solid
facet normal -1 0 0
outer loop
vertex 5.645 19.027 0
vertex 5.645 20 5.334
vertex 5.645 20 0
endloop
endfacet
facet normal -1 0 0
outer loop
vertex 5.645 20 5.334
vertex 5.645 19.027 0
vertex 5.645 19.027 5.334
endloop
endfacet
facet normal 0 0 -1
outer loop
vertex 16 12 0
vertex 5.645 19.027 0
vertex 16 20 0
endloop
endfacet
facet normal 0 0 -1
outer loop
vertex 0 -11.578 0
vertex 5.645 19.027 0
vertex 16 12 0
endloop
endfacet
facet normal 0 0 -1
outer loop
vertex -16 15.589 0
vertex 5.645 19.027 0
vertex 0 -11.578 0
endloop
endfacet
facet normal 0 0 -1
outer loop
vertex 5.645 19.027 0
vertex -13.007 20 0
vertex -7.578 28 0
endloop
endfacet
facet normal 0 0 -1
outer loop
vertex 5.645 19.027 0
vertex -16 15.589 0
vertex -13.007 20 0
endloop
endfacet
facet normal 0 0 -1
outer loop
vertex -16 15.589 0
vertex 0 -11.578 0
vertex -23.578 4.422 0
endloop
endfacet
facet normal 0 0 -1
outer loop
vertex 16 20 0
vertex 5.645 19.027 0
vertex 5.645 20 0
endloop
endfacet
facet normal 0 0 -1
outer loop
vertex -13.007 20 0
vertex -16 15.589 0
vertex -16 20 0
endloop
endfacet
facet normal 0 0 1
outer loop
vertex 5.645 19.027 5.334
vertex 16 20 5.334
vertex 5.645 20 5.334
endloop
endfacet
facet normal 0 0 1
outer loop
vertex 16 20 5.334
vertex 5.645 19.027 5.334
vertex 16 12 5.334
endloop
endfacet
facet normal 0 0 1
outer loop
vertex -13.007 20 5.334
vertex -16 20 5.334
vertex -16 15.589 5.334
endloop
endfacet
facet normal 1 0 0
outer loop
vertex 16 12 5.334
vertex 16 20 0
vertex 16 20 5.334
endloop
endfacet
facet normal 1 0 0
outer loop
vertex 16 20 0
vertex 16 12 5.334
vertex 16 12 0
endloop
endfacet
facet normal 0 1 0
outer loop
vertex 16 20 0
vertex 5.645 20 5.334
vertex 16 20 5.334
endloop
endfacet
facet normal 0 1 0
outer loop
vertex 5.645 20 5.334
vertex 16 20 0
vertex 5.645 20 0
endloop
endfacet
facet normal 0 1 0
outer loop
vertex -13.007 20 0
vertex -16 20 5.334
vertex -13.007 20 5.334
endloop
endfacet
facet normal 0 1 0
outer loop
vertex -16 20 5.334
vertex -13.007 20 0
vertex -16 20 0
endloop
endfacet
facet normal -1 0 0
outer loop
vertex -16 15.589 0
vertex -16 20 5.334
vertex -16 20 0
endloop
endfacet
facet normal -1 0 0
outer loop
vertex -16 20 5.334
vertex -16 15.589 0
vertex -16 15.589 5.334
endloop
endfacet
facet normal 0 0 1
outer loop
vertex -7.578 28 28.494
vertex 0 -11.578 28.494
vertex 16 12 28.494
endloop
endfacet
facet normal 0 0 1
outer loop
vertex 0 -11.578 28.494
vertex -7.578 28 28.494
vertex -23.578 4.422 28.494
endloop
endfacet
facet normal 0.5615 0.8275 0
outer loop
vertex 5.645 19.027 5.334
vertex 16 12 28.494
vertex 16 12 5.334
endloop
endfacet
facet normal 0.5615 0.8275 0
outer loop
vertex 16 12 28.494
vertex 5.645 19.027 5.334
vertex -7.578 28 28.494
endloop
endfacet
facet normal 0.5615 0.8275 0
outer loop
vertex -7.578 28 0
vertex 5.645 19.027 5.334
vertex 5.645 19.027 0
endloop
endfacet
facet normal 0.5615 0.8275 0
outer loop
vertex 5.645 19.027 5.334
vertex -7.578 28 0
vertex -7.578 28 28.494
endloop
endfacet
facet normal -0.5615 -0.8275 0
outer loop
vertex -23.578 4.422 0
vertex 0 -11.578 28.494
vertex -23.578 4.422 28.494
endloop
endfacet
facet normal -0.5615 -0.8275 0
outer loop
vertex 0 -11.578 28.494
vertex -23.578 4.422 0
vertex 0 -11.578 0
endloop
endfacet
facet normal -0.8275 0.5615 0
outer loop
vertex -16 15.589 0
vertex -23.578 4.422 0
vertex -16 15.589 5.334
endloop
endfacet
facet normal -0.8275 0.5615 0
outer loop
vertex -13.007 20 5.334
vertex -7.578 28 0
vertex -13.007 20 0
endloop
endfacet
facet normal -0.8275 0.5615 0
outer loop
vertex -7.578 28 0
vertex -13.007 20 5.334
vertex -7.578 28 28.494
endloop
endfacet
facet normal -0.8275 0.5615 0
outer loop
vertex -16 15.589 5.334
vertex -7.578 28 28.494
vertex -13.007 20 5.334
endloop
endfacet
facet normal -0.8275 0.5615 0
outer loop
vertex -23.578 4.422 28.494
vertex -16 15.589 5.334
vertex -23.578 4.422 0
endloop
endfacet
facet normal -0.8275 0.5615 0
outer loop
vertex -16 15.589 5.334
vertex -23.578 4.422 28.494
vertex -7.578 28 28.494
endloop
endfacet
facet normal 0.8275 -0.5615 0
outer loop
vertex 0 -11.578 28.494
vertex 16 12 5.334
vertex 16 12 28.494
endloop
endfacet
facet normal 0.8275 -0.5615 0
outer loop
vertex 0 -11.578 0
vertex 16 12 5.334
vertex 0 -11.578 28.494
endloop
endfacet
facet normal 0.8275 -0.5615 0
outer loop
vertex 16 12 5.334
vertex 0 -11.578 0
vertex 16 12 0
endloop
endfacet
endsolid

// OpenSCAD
trim=.2;
tw=32;
th=36;
td=25.4*.21;
sr=5;
sr2=0;
wings=0;
bspace=0;
try3=1;
jlap=4; //(th-tw)/2;
jbolt=2.5;
jlock=0;
jbex=jlock?6-td:0; //6-td;
olap=0; //jlap;
olap2=0; //olap;
bot=3;//25.4/4;
bit=bot;
xo=(tw-(sr*2)-(td+jbex))/3;

run=tw/2;
topy=th-tw/2;
dist1=sqrt(pow(topy-jlap*2,2)+pow(run,2));
ang1=atan((topy-jlap*2)-run);
dist2=sqrt(pow(bit/2-4,2)+pow(dist1,2));
boty=-bit/2-dist2/2;
rise=topy-(boty+jlap*2);
h=sqrt(pow(rise,2)+pow(run,2));
cutang=atan(rise/run);
echo(str("TD:",td,",XO:",xo,",Cut:",rise,"/",run,"~",cutang));
bblock();
#translate([0,boty]) rotate([0,0,cutang]) cube(h);
*!bblock_profile();
*!union(){
  xc=5;
  yc=8;
  xx=10;
  xy=th-tw-4;
  for(x=[0:tw+xx:(tw+xx)*(xc-1)+.01],y=[0:th+xy:(th+xy)*(yc-1)+.01])
    translate([x,y]) {
      bblock(0);
      translate([tw/2+xx/2,7]) rotate([0,0,180]) bblock(1);
    }
  if(bit!=bot) for(x=[0,tw+10]) translate([x,th]) cap();
}
*!for(s=[5,4,3]) translate([s*20-60,0]) spacer(s);
*!bblock(0);
*!preview(0);

*!union() {
  preview(0,40);
  translate([0,(th-jlap*2),tw/2])
  rotate([40,0]) translate([0,th-xo,tw/-2]) preview(-40,0);
}
module preview(ang1=0,ang2=0) {
  rotate([0,0,ang1]) {
    if(try3) translate([0,0,sr+xo]) copyz(xo*2) bblock(1);
    else translate([0,0,sr]) mirrorz(tw-sr*2) bblock(1);
    mirrorx3(0,xo*-2) translate([tw/2-sr-xo,th*2-tw-jlap*2,tw/2]) rotate([0,0,180]) rotate([0,90]) bblock(0);
  }
  rotate([0,0,ang2]) {
    translate([0,0,sr]) rotate([0,0,180]) {
      if(try3)
        copyz(xo*2) bblock(0);
      else
        mirrorz(tw-sr*2-xo*2)
        bblock(0);
    }
    translate([xo,0]) mirrorx3(0,xo*2) translate([tw/-2+sr,-(th*2-tw-jlap*2),tw/2]) rotate([0,90]) mirror([try3,0]) bblock(try3?0:1);
  }
}
module preview2(ang1=0,ang2=0) {
rotate([0,0,ang1]) for(y=[0]) translate([0,y]) {
  z=xo;
  translate([0,0,xo+jbex+1])
  mirrorz(xo+jbex*2)
  rotate([0,0,180])
  //translate([0,0,td]) mirror([0,0,1])
     bblock(1);
  mirrorx() translate([5+z-tw/2,-th,24]) rotate([0,90]) bblock(1);
rotate([0,0,ang2-ang1]) for(z=[0]) mirrorz(tw) {
  translate([0,0,z]) bblock();
  translate([z,0]) translate([-24,th,24]) rotate([0,90,0]) rotate([0,0,180]) bblock();
}
}
  cylinder(d=bit,h=50,$fn=40);
}
module bblock_profile(inner=0) {
  if(wings) mirrorx() rotate([0,0,inner?-10:-25]) hull() {
    circle(d=20,$fn=50);
    translate([tw/2-(inner?0:2),0]) circle(d=10,$fn=40);
  }
  difference() {
    union(){
      polygon([[tw/-2,topy-jlap*2],[tw/-2,topy],
      [tw/2,topy],[tw/2,topy-jlap*2],
      [0,boty]]);
      hull()
      {
        circle(d=bit+8,$fn=100);
        if(sr2>0)
          for(y=[0,-jlap*2]) translate([0,y]) mirrorx() translate([tw/2-sr2,th-tw/2-sr2]) circle(r=sr2,$fn=30);
        else
          translate([tw/-2,th-tw/2-jlap*2]) square([tw,jlap*2]);
      }
    }
    circle(d=bot==bit?bot:bot-2,$fn=40);
    mirrorx3(0,xo*2) translate([tw/-2+sr-trim,th-tw]) {
      for(x=(try3?[0]:[0,xo]))
      {
        small=0; //(inner==0)==(x==0)?0:2;
        tlap=(small==0||inner)?olap:olap2;
        translate([x-small/2,small>0?tw/2-tlap:tw/2-jlap])
        {
          square([td+trim*2,small>0?tlap:tw/2]);
        }
      }
    }
  }
}
module bblock(inner=0) {
  difference() {
    union() {
      linear_extrude(td,convexity=5) bblock_profile(inner);
      if(jbex>0&&jlock==1)
      {
        translate([tw/2,(th-tw)+tw/2-jlap+jbolt-trim,td/2+jbex/2]) rotate([0,-90,0]) cylinder(d=td+jbex,h=tw,$fn=30);
      }
      if(bspace&&bit==bot) translate([0,0,td]) cylinder(d1=bit+8,d2=bit+4,h=td+xo-td*2-trim*2,$fn=50);
    }
    mirrorx3(0,xo*2) translate([tw/-2+sr-trim,th-tw]) {
      for(x=(try3?[0]:[0,xo]))
      {
        small=0; //(inner==0)==(x==0)?0:2;
        tlap=(small==0||inner)?olap:olap2;
        translate([x-small/2,small>0?tw/2-tlap:tw/2-jlap,-.01])
        {
          cube([td+trim*2,small>0?tlap:tw/2,td+jbex+.02]);
          if(!inner&&jbex>0) translate([0,0,td]) cube([td+trim*2+small+jbex,small>0?tlap:tw/2,jbex+.02]);
        }
      }
    }
    if(bit!=bot) for(r=[0:120:359]) rotate([0,0,r-30]) translate([15,0,-.01]) cylinder(d=3,h=td+.02,$fn=20);
    mirrorx() {
        translate([tw/-2+sr+td/2,0]) translate([!inner?0:xo,(th-tw)+tw/2-jlap-jbolt+trim,-.01]) {
          if(jlock==1)
            translate([jbex*.5,0]) cylinder(d=3,h=10+td+.02,$fn=20);
          else if(jlock==2)
            for(z=[0,td+.01]) translate([td*-.5-.6,0,z]) rotate([0,90,0]) cylinder(d=2+trim*2,h=td+1.2,$fn=20);
        }
    }
    if(jlock==1)
      translate([tw/2+.01,(th-tw)+tw/2-jlap+jbolt-trim,td/2+jbex/2]) rotate([0,-90,0]) cylinder(d=3,h=tw+.02,$fn=20);
    if(bot!=bit)
      translate([0,0,-.01]) cylinder(d=bot-2,h=1.02,$fn=40);
    else
      translate([0,0,-.01]) cylinder(d=bit+trim*2,h=td+xo+.02,$fn=40);
    translate([0,0,1]) cylinder(d=bot+trim*2,h=td,$fn=40);
  }
  if(jlock==2)
      mirrorx() mirrorx(inner?xo:td+trim*2) translate([(!inner?(tw/2-sr-td/2):xo/2)+td/2+trim,(th-tw)+tw/2-jlap+jbolt-trim,-.01])
        cylinder(d=2,h=td,$fn=30);

  if(bit!=bot) {
    %translate([0,0,1]) linear_extrude(7,convexity=3) difference() {
      circle(d=bot,$fn=40);
      circle(d=bit,$fn=30);
    }
    translate([0,0,8]) %spacer();
    *color("blue") %translate([0,0,9.03]) mirror([0,0,1])
      cap();
  }
  
}
module spacer(h=0) {
  linear_extrude(h==0?xo-7:h,convexity=3) difference() {
      circle(d=12,$fn=36);
      circle(d=bit+.8,$fn=30);
  }
}

module cap()
{
  difference() {
    hull() {
      cylinder(d=40,h=9-td,$fn=50);
      for(r=[0:120:359]) rotate([0,0,r-30]) translate([15,0])
        cylinder(d=7,h=9-td,$fn=30);
    }
    for(r=[0:120:359]) rotate([0,0,r-30]) translate([15,0,-.01]) cylinder(d=3,h=9-td+.02,$fn=20);
    translate([0,0,1]) cylinder(d=bot+trim*2,h=8-td+.02,$fn=40);
    if(bot!=bit)
    translate([0,0,-.02]) cylinder(d=bot-2,h=td,$fn=40);
    else
      translate([0,0,-.02]) cylinder(d=bit,h=td,$fn=30);
  }
}

module mirrorx3(off=0,offc=0)
{
  if(try3) copyx(offc) children();
  else mirrorx(off) children();
}
module mirrorx(off=0)
{
  translate([off/2,0]) for(m=[0,1]) mirror([m,0]) translate([off/-2,0]) children();
}
module mirrorz(off=0)
{
  *copyz(off) children();
  translate([0,0,off/2]) for(m=[0,1]) mirror([0,0,m]) translate([0,0,off/-2]) children();
}
module copyx(off=0)
{
  for(c=[0,1]) translate([off*c,0]) children();
}
module copyz(off=0)
{
  for(c=[0,1]) translate([0,0,off*c]) children();
}
